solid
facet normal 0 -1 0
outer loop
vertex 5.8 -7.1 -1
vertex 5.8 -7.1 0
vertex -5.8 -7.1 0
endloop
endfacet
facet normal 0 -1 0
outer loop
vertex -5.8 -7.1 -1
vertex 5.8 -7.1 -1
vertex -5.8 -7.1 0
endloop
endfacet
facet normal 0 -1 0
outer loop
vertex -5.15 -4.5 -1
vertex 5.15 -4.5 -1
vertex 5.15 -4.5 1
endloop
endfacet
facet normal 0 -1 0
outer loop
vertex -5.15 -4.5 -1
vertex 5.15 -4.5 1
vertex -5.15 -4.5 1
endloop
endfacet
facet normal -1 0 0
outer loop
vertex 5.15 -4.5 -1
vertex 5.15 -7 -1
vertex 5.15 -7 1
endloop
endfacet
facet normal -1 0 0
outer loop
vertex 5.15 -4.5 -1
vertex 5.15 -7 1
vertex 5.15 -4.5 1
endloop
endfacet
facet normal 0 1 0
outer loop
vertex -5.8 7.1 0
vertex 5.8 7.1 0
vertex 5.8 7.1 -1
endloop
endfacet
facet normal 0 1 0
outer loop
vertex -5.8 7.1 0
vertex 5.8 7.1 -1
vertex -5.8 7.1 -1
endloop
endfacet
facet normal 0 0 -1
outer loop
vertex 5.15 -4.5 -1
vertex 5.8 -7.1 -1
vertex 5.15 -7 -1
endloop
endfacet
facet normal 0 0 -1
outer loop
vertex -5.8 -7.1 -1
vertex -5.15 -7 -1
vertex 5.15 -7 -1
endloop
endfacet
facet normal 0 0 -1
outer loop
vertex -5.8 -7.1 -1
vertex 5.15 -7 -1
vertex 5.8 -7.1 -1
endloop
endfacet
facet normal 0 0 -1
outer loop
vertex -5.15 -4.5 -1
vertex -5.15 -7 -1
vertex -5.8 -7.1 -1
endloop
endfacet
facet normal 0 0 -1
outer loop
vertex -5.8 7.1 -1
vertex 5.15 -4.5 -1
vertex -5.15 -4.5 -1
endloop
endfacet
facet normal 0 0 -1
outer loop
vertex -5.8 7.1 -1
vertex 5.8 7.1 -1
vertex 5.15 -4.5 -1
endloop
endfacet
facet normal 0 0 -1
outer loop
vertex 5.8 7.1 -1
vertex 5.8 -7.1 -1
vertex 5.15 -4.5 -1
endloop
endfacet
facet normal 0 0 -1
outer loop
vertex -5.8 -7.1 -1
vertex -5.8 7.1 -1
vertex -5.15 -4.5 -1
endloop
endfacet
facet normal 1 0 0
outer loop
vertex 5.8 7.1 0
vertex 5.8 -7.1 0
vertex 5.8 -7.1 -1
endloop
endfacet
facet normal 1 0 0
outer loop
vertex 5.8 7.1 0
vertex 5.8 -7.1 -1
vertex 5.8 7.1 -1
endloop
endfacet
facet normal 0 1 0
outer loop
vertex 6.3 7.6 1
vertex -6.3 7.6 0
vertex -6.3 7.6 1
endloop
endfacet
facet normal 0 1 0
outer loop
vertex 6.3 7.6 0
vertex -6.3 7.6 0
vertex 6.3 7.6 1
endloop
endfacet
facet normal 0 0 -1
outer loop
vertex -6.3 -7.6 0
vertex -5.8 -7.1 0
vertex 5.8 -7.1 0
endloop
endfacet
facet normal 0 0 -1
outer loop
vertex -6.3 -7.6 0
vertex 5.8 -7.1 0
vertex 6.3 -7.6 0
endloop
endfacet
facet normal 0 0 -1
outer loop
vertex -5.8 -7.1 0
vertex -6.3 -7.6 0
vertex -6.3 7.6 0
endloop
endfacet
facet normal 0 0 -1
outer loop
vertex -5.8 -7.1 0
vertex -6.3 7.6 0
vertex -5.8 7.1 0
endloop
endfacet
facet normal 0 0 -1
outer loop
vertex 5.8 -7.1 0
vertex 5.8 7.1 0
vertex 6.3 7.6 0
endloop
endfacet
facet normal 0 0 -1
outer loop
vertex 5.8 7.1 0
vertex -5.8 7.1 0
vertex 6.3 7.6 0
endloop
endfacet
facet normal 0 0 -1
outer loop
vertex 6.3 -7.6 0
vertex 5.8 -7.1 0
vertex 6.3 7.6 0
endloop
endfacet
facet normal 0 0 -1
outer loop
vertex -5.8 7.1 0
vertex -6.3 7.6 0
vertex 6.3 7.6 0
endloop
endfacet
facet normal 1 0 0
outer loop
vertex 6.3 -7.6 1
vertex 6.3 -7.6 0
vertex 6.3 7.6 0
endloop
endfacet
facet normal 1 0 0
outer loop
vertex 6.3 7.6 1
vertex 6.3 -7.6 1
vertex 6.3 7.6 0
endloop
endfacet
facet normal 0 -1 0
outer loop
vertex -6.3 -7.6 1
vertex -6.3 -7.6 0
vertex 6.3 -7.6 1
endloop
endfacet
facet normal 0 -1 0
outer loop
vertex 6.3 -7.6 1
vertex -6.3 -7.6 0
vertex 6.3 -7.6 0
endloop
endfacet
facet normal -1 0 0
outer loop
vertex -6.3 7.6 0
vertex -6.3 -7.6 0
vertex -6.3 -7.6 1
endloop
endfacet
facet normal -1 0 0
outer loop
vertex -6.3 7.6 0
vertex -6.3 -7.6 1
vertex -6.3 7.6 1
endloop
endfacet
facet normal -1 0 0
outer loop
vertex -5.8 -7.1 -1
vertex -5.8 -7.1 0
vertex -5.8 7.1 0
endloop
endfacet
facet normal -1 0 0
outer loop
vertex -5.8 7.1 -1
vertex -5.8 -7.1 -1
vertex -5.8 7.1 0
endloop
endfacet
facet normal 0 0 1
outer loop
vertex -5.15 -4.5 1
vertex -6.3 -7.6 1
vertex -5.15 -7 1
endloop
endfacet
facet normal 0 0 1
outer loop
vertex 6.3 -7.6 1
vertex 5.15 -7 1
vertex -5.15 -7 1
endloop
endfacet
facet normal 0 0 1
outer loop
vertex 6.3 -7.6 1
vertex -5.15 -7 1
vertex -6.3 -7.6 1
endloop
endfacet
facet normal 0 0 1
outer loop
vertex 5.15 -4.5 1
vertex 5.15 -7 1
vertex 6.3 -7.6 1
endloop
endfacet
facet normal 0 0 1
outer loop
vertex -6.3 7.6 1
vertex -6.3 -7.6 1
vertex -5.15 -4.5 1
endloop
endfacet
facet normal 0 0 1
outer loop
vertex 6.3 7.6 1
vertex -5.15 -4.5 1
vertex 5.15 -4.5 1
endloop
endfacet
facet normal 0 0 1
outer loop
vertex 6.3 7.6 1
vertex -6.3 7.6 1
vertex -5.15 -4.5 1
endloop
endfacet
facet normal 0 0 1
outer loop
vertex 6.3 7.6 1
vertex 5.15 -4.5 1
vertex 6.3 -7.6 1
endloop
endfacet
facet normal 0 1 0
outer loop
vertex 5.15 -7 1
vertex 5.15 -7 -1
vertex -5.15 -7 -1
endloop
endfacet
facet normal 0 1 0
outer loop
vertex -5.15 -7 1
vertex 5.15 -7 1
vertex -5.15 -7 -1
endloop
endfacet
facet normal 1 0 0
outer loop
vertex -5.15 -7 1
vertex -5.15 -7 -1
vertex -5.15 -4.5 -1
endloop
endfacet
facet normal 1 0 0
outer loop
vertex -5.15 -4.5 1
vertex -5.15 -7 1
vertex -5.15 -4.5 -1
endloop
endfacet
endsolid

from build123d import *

# Parameters (mm, degrees)
SKETCH2_W           = 12.6
SKETCH2_H           = 15.2
BOSS_EXTRUDE1_DEPTH = 1
SKETCH3_W           = 11.6
SKETCH3_H           = 14.2
BOSS_EXTRUDE2_DEPTH = 1
SKETCH4_W           = 10.3
SKETCH4_H           = 2.5
CUT_EXTRUDE1_DEPTH  = 4


with BuildPart() as part:
    # Sketch2 → Boss-Extrude1 (new body)
    with BuildSketch(Plane.XY):
        Rectangle(SKETCH2_W, SKETCH2_H)
    extrude(amount=BOSS_EXTRUDE1_DEPTH)

    # Sketch3 → Boss-Extrude2 (add)
    with BuildSketch(Plane(origin=(0, 0, 0), x_dir=(-1, 0, 0), z_dir=(0, 0, -1))):
        Rectangle(SKETCH3_W, SKETCH3_H)
    extrude(amount=BOSS_EXTRUDE2_DEPTH)

    # Sketch4 → Cut-Extrude1 (cut)
    with BuildSketch(Plane(origin=(0, 0, -1), x_dir=(-1, 0, 0), z_dir=(0, 0, -1))):
        with Locations((0, -5.75)):
            Rectangle(SKETCH4_W, SKETCH4_H)
    extrude(amount=-CUT_EXTRUDE1_DEPTH, mode=Mode.SUBTRACT)


solid = part.part
